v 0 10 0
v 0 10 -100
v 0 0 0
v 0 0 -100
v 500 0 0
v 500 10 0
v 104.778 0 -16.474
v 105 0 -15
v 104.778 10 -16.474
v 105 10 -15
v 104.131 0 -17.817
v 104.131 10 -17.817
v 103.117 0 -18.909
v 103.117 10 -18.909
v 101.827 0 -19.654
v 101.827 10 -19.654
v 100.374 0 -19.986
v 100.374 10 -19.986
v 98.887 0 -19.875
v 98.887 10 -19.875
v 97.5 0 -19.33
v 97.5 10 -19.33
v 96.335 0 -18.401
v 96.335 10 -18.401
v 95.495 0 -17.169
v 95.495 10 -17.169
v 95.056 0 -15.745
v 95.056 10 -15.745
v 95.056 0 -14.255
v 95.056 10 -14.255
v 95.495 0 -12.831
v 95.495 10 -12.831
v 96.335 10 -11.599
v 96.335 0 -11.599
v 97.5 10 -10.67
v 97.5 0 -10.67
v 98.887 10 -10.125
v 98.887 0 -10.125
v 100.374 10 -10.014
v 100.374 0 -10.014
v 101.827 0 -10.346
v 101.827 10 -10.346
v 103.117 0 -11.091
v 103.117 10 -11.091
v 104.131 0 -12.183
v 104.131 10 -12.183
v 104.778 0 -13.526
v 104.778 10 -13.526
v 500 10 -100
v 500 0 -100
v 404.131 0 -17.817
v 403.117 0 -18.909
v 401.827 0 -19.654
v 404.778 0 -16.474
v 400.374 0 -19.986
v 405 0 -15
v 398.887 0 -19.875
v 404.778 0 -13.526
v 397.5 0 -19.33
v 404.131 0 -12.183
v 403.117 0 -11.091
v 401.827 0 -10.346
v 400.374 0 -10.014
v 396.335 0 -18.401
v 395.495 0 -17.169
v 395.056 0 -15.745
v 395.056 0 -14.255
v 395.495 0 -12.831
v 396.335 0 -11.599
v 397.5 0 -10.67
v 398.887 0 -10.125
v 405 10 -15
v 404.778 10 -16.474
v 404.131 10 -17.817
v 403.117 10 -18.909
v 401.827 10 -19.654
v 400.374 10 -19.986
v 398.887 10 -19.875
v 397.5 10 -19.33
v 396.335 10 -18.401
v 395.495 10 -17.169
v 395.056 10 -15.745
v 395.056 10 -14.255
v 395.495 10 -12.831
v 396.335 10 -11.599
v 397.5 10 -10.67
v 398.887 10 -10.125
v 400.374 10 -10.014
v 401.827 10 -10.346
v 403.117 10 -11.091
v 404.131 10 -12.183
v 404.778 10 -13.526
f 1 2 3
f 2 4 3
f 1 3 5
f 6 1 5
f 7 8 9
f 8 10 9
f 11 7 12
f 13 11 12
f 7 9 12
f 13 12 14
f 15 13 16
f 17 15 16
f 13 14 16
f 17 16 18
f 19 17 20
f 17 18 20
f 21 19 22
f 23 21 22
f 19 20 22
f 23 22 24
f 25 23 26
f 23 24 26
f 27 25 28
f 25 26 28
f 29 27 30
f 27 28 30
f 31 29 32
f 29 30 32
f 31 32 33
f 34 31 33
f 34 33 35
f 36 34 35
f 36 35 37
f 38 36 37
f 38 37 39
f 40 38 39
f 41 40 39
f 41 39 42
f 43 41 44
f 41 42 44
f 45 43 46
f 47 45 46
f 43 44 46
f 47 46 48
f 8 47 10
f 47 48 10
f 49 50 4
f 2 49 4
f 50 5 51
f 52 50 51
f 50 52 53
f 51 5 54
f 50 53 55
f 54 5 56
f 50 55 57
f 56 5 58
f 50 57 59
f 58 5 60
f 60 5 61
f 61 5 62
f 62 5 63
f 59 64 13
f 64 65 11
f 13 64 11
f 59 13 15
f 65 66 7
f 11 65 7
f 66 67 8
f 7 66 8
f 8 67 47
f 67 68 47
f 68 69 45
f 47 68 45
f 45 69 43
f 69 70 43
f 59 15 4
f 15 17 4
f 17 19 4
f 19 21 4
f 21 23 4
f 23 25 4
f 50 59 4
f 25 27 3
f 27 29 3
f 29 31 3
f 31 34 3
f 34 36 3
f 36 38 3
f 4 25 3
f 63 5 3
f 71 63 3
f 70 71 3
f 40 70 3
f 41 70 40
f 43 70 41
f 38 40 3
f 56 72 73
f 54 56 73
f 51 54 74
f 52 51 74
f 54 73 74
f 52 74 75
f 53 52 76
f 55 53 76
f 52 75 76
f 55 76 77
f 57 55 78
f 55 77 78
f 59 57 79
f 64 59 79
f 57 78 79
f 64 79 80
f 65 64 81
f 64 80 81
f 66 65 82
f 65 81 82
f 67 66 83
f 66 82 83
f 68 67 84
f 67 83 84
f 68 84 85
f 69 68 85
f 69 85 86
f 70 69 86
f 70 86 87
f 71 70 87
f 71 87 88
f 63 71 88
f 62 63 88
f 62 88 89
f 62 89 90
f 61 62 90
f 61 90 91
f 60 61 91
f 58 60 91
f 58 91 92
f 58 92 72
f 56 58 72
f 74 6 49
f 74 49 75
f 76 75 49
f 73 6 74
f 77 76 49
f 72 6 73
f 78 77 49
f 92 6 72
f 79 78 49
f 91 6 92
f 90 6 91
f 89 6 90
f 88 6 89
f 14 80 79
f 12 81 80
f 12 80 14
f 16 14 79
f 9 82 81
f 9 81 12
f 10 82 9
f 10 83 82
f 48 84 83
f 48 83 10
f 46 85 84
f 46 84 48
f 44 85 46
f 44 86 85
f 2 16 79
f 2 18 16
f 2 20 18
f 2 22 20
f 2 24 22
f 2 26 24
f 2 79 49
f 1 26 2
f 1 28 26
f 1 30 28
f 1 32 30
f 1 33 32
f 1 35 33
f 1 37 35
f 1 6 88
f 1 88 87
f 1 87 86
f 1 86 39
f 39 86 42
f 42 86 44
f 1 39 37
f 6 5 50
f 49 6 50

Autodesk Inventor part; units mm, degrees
ref_plane "YZ Plane" through (0, 0, 0) normal (1, 0, 0) x (0, 1, 0)
ref_plane "XZ Plane" through (0, 0, 0) normal (0, 1, 0) x (-1, 0, 0)
ref_plane "XY Plane" through (0, 0, 0) normal (0, 0, 1) x (1, 0, 0)
sketch "Sketch1" plane through (0, 0, 0) normal (0, 1, 0) x (-1, 0, 0)
  line L0 (0, 0) -> (-500, 0)
  line L1 (-500, 0) -> (-500, -100)
  line L2 (-500, -100) -> (0, -100)
  line L3 (0, -100) -> (0, 0)
  dimension "d0" = 500
  dimension "d1" = 100
extrude "Extrusion1" add sketch "Sketch1" along normal blind 10
sketch "Sketch2" plane through (0, 10, 0) normal (0, 1, 0) x (1, 0, 0)
  point P0 (0, 0)
sketch "Sketch3" plane through (0, 10, 0) normal (0, 1, 0) x (1, 0, 0)
  circle A0 centre (100, 15) radius 5
  circle A1 centre (400, 15) radius 5
  line L0 (0, 0) -> (500, 0) projected
  line L1 (500, 0) -> (500, 100) projected
  line L2 (0, 100) -> (0, 0) projected
  dimension "d5" = 10
  dimension "d6" = 10
  dimension "d7" = 15
  dimension "d8" = 15
  dimension "d9" = 100
  dimension "d10" = 100
extrude "Extrusion2" cut sketch "Sketch3" against normal blind 10
equation "\"d6\" = d5"
equation "\"d8\" = d7"
equation "\"d10\" = d9"
properties part number "blend_10cm"
